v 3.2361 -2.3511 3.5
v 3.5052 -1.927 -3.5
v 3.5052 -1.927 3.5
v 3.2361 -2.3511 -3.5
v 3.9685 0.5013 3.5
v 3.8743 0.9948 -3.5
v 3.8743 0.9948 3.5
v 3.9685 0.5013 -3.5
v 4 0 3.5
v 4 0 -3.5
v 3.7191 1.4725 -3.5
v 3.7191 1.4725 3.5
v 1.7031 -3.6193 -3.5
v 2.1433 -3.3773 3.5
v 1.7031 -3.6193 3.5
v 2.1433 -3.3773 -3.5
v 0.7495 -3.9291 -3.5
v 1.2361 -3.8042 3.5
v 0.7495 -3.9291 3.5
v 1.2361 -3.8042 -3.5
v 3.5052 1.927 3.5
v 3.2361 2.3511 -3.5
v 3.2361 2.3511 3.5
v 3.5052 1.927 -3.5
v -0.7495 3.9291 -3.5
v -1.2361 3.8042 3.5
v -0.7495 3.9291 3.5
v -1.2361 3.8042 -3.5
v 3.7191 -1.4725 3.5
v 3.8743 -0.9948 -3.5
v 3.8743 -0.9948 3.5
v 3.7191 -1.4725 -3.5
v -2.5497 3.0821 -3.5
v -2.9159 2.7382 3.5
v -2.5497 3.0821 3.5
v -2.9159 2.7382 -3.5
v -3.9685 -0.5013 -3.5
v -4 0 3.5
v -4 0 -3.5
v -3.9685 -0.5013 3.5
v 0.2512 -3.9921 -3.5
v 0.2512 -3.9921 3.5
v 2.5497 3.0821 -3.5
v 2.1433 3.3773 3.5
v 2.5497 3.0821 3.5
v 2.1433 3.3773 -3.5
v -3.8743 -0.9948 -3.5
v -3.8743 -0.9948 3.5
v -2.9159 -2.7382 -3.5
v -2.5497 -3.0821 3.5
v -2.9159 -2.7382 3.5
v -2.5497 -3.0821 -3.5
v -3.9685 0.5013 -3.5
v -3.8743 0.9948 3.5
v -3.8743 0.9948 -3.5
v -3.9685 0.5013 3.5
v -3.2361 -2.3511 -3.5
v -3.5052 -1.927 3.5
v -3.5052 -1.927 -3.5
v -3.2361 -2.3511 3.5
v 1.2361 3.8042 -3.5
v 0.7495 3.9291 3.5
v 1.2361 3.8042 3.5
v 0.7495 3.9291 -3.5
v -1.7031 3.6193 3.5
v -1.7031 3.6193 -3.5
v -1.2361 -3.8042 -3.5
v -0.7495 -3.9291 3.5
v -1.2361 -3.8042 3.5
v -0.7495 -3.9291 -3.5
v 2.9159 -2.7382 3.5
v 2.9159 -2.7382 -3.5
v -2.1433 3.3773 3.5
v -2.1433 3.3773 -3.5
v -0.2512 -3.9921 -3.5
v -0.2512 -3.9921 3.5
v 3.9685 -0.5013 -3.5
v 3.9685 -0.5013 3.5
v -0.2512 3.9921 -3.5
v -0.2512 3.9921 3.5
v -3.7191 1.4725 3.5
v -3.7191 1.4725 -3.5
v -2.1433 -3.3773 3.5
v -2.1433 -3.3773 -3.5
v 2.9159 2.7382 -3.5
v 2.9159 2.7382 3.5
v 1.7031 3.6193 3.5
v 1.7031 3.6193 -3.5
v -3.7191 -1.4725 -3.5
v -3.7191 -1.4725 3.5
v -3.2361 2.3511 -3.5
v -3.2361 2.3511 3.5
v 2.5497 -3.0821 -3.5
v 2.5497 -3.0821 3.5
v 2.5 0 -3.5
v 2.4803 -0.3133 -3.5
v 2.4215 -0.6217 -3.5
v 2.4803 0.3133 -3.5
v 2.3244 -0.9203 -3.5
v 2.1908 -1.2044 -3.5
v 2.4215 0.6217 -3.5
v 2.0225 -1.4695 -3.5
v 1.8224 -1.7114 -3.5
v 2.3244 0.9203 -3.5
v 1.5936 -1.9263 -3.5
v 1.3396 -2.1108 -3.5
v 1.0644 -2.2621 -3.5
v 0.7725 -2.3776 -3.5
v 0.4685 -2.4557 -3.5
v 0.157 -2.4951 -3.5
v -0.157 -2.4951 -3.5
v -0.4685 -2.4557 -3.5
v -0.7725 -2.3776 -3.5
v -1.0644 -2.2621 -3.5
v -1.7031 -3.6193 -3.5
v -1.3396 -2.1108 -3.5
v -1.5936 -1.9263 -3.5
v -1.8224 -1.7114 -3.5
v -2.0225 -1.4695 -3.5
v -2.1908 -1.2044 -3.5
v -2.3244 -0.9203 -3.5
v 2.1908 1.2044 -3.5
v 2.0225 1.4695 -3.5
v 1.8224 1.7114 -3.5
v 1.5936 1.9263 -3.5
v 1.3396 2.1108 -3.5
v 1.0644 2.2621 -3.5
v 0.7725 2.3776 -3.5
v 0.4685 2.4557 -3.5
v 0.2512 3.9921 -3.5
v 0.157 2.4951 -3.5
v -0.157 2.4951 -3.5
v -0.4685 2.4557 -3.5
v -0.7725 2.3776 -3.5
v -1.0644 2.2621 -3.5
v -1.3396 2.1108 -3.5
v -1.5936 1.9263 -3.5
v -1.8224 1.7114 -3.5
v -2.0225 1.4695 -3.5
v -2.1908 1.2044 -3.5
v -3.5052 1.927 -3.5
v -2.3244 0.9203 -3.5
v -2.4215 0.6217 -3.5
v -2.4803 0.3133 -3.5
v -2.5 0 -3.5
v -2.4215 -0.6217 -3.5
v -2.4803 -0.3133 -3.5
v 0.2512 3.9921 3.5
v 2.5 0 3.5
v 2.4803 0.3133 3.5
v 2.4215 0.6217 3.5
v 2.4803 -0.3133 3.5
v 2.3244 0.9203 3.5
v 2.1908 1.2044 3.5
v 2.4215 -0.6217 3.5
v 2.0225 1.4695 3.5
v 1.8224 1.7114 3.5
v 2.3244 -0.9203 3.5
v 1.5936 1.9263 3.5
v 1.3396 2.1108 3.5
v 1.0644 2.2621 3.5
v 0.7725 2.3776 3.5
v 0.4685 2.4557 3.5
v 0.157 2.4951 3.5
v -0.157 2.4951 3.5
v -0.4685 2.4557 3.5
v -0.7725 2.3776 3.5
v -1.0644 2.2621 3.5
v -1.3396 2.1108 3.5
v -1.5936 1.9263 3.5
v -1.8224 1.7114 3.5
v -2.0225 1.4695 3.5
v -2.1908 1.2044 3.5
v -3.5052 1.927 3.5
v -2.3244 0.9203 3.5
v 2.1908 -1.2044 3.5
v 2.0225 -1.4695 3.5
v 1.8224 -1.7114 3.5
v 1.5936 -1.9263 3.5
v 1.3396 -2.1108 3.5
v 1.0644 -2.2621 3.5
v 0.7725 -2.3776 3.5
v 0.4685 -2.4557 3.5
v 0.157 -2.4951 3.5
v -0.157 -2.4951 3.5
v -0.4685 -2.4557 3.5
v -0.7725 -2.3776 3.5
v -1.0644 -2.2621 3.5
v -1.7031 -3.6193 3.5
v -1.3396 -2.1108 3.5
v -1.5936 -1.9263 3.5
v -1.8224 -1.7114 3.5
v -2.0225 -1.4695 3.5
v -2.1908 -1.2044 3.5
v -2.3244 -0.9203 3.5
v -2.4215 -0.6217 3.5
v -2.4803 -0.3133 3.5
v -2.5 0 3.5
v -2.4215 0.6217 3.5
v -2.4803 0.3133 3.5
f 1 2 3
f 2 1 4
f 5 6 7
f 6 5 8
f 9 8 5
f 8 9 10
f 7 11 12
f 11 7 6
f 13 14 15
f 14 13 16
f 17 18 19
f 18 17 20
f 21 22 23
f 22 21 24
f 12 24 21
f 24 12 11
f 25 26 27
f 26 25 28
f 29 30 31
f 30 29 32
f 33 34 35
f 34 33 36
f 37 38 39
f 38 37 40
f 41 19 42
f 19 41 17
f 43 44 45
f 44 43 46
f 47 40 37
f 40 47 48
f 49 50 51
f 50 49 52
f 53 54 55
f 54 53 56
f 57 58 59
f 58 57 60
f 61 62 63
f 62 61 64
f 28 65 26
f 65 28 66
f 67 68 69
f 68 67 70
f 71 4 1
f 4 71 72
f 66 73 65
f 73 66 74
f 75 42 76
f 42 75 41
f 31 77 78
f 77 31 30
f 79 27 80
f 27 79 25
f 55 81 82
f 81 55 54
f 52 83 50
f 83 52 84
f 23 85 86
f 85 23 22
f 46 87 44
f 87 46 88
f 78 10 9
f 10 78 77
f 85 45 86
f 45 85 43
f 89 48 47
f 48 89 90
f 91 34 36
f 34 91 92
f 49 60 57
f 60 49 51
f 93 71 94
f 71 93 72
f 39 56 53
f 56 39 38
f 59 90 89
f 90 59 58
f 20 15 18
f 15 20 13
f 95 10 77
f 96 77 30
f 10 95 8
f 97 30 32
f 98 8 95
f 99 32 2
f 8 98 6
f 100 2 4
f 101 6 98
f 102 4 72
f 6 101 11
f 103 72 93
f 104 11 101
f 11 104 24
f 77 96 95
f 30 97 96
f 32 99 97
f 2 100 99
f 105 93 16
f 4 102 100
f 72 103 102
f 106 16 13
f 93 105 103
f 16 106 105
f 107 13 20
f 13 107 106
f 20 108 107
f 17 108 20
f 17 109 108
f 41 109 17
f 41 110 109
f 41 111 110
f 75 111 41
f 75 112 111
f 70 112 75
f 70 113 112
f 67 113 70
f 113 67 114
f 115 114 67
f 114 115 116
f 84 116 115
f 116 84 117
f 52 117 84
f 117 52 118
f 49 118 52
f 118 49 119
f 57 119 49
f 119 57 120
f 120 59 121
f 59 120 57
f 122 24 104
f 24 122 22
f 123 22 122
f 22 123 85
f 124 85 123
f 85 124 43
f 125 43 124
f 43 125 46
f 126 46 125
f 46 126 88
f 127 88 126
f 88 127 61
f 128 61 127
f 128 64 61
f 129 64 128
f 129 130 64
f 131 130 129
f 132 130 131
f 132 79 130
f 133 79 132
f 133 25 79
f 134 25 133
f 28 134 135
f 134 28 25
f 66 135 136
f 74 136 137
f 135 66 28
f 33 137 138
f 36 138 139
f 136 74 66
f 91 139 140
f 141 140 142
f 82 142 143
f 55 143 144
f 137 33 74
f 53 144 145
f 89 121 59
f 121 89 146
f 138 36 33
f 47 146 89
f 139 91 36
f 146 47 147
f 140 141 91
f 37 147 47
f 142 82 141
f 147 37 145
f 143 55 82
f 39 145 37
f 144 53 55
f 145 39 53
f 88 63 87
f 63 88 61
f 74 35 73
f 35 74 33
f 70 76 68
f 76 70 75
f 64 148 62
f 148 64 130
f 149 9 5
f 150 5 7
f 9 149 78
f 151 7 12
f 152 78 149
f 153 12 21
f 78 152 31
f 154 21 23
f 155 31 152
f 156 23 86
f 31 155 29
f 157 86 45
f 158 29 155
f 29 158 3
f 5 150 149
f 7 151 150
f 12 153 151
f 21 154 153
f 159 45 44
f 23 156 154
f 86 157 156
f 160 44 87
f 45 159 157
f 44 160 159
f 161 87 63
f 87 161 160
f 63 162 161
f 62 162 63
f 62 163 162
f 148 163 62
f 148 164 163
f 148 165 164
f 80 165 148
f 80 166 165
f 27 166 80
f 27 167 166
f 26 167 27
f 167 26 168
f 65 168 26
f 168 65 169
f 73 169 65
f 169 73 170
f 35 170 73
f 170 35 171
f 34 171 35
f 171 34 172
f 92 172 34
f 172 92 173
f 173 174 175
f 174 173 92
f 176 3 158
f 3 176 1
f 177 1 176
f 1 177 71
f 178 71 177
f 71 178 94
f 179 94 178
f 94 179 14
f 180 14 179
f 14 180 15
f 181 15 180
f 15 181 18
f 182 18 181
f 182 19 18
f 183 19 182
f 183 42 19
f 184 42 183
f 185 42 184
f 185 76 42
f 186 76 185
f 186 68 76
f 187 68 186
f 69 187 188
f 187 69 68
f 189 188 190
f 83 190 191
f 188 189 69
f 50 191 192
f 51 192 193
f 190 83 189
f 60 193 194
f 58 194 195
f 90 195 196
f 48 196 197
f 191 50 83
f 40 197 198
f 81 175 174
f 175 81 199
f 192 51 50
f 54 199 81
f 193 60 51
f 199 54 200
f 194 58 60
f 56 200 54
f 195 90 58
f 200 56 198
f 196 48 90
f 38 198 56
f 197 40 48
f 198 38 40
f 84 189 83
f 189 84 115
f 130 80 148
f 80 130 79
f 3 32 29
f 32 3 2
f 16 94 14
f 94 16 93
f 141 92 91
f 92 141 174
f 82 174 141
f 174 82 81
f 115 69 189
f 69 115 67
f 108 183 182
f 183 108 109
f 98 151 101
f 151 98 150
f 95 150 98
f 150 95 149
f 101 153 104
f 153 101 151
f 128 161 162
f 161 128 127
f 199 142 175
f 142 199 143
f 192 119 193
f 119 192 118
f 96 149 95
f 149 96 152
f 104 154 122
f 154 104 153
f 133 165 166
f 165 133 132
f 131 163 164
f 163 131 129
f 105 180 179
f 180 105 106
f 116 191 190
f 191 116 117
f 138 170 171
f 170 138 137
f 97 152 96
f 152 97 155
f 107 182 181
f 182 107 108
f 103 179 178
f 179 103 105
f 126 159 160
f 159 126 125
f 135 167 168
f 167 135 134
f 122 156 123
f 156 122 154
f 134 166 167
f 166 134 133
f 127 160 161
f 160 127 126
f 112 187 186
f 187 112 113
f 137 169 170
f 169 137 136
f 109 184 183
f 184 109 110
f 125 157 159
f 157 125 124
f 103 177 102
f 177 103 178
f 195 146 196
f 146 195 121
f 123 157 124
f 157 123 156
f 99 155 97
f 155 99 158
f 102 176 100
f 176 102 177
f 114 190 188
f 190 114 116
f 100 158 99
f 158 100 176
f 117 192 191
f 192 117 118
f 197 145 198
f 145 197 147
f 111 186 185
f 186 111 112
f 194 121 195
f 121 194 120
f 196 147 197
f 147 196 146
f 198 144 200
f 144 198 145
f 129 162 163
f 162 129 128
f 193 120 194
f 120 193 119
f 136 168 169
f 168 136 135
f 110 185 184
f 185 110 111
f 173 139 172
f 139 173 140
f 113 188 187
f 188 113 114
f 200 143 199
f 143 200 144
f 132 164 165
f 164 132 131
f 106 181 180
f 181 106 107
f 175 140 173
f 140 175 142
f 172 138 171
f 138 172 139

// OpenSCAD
$fn = 50;


difference() {
	union() {
		translate(v = [0, 0, -3.5000000000]) {
			cylinder(h = 7, r = 4.0000000000);
		}
	}
	union() {
		translate(v = [0, 0, -100.0000000000]) {
			cylinder(h = 200, r = 2.5000000000);
		}
	}
}
